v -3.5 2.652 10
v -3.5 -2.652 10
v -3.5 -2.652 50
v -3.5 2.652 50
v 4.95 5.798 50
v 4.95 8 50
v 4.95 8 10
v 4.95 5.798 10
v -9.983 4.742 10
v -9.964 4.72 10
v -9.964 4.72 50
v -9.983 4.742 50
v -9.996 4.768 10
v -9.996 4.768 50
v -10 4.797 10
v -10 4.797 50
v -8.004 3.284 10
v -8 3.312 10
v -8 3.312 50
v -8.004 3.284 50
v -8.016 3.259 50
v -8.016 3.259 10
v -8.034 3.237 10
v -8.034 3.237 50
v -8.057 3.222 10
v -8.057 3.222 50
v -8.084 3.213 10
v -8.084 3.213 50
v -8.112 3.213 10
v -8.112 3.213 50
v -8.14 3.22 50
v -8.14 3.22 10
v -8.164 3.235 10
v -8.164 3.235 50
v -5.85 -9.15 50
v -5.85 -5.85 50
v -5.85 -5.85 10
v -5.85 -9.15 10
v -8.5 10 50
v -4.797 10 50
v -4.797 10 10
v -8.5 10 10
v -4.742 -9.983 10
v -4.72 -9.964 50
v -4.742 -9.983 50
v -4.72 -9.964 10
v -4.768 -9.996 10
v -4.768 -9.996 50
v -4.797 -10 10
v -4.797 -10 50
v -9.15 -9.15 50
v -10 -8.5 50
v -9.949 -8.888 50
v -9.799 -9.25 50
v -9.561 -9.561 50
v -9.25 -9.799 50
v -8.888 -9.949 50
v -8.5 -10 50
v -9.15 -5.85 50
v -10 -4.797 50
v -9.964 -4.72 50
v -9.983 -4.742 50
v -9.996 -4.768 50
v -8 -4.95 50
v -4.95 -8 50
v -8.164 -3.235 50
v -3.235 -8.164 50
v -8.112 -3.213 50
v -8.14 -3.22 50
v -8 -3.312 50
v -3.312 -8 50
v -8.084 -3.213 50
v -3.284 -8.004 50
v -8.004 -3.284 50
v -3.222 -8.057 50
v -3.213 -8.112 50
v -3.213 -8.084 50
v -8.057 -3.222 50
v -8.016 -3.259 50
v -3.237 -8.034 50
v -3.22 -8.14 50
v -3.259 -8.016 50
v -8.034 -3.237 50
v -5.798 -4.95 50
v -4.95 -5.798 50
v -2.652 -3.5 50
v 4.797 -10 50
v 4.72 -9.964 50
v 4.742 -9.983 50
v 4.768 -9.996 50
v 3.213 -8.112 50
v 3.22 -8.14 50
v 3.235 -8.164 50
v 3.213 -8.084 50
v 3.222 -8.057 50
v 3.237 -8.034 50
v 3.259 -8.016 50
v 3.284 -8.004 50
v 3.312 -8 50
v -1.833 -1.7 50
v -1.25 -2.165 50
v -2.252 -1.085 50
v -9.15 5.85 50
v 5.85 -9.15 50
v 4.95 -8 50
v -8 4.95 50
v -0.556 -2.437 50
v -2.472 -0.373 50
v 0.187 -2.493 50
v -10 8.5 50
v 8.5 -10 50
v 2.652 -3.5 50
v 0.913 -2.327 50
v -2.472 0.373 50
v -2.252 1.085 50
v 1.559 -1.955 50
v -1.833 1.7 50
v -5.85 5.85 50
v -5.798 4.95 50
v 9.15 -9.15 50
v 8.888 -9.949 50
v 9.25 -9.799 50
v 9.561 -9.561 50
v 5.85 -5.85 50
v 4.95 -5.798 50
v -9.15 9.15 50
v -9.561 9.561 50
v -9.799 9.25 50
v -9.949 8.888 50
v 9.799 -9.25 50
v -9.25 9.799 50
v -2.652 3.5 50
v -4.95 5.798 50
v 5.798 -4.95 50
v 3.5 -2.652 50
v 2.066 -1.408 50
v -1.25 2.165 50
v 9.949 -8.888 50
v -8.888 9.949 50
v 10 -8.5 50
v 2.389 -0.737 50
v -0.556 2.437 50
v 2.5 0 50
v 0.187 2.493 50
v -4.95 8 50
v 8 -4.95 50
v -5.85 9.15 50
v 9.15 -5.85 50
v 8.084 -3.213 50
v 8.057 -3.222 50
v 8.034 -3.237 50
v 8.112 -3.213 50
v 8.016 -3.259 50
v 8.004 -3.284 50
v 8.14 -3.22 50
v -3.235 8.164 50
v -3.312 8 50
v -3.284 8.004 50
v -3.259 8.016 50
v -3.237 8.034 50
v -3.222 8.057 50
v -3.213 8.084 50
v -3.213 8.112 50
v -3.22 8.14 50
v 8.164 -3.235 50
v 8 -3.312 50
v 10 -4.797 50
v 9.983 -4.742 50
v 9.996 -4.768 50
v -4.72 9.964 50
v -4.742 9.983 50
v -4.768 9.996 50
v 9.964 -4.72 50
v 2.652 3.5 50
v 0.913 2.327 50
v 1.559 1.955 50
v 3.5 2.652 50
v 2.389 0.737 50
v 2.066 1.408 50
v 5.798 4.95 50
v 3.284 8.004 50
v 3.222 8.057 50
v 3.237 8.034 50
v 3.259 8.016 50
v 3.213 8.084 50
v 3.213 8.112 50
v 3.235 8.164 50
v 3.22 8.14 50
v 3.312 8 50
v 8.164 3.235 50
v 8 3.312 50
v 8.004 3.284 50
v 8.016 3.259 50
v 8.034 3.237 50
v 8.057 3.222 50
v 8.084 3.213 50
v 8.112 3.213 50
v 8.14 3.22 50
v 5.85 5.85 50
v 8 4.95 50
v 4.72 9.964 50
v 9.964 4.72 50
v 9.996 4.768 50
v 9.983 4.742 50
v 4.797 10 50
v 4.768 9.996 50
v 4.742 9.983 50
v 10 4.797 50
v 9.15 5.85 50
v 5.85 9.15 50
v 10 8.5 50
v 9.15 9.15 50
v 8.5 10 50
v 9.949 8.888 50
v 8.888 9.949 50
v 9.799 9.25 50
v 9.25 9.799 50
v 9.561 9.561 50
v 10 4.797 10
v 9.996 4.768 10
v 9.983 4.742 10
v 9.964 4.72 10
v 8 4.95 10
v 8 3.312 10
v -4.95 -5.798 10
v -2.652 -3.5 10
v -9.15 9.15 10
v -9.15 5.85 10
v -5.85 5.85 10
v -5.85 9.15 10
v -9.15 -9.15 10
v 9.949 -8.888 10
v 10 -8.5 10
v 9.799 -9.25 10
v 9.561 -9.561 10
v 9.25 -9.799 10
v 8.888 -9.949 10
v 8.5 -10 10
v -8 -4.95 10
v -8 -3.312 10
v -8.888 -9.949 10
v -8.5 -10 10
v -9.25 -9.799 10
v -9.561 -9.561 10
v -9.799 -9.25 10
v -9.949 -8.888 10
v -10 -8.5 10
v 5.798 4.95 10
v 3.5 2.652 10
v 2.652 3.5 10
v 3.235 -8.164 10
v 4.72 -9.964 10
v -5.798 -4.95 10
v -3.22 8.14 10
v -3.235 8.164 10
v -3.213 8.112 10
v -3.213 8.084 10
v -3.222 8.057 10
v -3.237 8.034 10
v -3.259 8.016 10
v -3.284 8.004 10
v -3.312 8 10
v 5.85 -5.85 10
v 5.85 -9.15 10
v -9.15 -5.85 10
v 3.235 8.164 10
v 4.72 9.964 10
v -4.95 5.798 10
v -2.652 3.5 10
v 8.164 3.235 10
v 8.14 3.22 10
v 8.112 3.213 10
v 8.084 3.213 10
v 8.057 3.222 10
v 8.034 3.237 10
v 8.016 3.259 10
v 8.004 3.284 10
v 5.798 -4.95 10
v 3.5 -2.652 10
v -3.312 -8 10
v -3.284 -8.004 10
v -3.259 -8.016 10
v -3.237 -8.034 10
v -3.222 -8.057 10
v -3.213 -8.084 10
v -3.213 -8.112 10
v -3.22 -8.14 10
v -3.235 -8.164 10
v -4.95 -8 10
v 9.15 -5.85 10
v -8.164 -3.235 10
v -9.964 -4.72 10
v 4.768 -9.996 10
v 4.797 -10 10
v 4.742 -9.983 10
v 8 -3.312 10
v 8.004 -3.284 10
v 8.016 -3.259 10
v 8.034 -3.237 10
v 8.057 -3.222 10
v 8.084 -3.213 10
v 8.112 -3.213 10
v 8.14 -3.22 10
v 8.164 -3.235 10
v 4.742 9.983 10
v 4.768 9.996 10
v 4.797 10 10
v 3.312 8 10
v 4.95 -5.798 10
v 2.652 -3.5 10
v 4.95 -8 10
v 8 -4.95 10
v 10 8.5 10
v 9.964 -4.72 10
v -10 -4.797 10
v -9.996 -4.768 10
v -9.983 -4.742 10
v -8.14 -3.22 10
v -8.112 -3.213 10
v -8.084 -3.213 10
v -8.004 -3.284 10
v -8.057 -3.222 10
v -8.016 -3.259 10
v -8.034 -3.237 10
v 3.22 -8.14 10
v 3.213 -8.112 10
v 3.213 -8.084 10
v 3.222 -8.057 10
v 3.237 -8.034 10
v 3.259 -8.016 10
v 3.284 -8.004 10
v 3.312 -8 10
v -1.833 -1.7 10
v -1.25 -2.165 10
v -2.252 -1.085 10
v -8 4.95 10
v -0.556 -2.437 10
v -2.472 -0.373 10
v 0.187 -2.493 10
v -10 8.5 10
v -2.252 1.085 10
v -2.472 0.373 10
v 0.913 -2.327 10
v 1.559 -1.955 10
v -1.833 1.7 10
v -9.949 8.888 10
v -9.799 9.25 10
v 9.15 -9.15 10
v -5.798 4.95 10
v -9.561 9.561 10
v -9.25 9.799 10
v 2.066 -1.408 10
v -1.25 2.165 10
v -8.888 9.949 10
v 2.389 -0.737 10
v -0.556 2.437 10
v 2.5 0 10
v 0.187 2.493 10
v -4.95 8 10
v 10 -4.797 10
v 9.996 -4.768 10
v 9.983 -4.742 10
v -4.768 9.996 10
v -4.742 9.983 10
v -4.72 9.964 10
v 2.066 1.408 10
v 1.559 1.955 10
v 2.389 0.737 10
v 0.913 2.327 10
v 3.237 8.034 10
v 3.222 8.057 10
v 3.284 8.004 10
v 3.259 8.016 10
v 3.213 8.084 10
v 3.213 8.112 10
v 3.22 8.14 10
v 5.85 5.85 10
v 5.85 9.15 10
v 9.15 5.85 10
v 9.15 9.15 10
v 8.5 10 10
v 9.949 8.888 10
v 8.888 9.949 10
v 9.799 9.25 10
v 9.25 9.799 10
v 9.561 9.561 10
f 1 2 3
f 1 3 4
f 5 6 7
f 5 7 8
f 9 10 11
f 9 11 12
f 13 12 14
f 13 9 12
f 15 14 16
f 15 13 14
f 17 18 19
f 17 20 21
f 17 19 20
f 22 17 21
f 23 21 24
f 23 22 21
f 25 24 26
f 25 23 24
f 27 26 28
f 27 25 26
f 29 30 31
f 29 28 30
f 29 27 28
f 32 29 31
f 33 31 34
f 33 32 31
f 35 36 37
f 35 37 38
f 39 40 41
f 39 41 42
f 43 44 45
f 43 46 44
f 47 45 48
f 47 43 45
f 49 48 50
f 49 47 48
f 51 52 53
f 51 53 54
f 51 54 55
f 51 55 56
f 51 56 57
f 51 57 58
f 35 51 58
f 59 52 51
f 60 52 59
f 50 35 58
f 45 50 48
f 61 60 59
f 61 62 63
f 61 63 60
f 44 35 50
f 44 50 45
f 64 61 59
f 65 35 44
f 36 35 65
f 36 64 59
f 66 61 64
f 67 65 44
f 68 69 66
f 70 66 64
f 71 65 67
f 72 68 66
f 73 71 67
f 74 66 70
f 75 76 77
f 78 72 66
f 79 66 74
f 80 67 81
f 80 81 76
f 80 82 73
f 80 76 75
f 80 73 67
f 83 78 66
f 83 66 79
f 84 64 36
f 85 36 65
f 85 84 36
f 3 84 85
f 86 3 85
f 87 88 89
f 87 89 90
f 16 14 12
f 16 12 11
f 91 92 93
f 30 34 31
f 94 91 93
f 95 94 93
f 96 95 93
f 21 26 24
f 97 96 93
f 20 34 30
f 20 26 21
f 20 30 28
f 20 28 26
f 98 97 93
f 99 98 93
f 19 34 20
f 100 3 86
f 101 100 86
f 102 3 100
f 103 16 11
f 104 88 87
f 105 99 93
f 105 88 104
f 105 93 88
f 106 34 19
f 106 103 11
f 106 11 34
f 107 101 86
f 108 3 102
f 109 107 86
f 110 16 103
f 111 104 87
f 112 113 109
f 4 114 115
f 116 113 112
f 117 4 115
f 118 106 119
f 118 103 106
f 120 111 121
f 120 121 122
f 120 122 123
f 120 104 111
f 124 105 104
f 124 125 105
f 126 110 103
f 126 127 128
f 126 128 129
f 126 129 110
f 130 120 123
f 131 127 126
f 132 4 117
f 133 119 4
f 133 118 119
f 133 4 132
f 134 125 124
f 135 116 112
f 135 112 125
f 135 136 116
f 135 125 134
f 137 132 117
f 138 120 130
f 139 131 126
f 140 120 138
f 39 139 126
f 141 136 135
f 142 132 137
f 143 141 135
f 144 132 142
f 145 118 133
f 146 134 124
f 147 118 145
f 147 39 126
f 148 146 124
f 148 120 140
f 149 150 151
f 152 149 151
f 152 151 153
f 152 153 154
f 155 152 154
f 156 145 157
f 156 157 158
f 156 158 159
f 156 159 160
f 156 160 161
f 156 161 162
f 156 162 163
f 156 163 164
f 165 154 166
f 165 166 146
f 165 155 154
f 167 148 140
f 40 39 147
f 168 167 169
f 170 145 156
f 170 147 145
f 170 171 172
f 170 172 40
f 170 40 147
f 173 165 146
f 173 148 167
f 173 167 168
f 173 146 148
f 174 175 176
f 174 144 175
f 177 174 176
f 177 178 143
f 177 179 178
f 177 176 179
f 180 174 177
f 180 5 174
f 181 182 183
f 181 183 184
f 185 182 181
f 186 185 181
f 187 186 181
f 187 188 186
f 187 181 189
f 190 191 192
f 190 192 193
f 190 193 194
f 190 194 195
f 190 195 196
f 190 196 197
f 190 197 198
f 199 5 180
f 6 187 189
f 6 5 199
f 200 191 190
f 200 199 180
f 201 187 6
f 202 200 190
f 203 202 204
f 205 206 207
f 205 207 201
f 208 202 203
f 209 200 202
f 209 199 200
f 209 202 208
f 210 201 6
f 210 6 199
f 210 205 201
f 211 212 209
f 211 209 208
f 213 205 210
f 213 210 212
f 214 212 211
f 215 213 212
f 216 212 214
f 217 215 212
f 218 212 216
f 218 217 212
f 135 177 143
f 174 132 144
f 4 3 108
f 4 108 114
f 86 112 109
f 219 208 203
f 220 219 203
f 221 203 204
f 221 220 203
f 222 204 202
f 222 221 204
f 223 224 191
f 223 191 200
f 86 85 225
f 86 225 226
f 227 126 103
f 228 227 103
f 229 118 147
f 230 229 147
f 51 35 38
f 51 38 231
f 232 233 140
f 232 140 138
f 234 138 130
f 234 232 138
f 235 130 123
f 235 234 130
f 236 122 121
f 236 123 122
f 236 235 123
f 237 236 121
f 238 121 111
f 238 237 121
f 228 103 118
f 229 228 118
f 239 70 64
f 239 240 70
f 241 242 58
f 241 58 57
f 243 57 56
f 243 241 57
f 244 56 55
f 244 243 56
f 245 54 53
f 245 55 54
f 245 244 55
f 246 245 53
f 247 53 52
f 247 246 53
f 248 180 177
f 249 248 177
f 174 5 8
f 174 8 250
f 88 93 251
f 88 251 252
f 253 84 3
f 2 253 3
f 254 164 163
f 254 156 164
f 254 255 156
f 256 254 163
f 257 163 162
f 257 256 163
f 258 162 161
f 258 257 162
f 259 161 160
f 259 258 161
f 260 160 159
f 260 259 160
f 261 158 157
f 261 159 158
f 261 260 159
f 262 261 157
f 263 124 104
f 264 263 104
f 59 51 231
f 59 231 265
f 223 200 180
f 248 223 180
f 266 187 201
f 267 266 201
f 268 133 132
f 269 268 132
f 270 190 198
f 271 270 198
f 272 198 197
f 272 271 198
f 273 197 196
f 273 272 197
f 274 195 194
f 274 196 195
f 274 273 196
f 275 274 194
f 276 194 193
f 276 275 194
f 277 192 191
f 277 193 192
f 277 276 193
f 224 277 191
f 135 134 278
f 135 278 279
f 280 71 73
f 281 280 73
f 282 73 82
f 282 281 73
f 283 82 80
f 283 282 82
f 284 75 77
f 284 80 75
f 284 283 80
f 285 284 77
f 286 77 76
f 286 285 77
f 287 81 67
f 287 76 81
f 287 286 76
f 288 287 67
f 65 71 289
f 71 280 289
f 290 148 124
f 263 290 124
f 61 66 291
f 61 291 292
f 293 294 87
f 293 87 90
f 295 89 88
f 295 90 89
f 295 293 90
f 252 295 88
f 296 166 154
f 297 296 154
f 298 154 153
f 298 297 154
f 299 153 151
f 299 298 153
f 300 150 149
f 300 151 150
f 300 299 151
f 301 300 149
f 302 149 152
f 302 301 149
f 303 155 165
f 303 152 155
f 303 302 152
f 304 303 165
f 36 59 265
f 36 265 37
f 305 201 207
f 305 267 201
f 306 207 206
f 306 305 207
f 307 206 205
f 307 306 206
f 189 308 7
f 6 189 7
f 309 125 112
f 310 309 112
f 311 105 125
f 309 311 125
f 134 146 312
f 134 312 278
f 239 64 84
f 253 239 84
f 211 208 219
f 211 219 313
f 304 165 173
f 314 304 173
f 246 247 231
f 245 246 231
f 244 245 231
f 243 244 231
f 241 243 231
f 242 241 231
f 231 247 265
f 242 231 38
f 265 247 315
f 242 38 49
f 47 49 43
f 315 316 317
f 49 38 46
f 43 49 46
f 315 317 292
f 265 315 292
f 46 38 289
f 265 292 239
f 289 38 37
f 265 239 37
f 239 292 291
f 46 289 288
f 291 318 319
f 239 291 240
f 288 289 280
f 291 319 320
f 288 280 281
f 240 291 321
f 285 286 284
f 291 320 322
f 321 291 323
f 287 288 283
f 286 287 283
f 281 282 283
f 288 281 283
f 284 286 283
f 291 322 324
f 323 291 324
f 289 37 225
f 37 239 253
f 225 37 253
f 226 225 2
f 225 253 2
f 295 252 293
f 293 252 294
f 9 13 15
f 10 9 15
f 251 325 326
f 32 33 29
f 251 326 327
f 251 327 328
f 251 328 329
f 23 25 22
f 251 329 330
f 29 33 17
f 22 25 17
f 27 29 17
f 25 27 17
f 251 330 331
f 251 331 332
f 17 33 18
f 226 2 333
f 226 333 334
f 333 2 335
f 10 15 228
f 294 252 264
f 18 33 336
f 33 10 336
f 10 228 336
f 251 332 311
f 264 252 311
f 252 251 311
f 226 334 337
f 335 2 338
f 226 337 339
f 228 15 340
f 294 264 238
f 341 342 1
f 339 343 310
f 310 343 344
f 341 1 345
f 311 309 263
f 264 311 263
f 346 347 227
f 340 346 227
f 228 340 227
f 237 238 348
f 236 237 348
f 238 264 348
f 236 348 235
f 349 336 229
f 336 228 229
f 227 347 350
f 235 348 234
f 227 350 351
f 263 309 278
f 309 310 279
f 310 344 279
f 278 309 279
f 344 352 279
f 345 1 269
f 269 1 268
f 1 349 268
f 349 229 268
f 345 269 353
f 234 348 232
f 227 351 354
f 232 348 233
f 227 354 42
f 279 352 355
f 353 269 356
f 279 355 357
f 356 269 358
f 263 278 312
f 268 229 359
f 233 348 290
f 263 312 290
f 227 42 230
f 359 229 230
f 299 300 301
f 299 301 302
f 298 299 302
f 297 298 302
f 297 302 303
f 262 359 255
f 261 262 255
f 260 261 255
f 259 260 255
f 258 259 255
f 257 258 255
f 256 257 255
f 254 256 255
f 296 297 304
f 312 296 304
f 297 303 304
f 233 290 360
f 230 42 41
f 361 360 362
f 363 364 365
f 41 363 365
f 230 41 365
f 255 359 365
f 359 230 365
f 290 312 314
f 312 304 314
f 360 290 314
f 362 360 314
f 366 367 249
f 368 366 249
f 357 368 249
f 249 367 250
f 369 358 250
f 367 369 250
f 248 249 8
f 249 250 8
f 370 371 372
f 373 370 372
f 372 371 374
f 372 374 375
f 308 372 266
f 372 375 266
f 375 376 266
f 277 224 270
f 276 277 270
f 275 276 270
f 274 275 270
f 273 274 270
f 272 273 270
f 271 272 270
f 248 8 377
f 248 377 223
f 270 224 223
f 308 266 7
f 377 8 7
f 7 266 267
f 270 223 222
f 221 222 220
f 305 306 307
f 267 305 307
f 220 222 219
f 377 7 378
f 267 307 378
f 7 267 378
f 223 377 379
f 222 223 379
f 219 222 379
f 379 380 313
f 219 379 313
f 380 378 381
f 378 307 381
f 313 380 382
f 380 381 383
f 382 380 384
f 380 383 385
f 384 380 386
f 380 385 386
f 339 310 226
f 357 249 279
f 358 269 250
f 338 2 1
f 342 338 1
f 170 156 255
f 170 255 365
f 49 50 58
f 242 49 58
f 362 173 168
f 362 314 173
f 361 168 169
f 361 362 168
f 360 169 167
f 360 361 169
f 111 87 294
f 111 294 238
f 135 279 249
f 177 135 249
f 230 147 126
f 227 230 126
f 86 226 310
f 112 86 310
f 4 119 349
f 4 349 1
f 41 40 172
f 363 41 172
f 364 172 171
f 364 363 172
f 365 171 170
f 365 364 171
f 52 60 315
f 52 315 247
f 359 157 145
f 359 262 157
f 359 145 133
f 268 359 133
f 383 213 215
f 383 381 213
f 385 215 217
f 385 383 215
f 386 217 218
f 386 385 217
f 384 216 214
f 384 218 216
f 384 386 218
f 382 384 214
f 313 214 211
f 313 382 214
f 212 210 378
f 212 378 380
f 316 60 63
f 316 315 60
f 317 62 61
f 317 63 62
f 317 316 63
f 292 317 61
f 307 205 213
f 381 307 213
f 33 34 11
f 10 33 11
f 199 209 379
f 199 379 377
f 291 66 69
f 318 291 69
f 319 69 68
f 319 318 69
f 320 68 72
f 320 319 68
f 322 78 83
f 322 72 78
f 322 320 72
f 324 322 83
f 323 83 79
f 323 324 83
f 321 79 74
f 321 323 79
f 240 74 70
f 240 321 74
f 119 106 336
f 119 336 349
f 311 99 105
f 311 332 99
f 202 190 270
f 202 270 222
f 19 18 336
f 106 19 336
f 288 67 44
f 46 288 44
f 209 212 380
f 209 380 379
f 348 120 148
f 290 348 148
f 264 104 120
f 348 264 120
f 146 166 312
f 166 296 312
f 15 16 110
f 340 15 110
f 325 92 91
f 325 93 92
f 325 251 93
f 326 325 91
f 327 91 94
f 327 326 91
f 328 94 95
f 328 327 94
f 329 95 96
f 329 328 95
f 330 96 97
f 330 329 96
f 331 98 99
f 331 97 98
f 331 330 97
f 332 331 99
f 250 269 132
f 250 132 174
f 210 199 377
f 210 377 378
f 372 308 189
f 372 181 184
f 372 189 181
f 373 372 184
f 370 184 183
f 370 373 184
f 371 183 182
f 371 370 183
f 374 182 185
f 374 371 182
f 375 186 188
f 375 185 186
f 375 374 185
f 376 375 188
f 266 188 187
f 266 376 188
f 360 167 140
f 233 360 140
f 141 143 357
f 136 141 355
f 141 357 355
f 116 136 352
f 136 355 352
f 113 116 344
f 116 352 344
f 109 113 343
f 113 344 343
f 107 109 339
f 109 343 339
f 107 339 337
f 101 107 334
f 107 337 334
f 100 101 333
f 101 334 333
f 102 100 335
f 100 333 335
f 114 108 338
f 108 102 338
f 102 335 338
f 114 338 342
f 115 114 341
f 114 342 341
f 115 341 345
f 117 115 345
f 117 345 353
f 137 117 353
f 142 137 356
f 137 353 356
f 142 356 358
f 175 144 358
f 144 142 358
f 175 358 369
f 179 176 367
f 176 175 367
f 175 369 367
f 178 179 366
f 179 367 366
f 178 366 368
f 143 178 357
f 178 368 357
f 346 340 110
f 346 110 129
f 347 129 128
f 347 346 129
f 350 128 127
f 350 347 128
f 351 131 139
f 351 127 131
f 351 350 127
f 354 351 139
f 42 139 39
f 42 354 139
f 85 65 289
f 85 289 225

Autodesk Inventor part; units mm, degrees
ref_plane "Начальная плоскость" through (0, 0, 10) normal (0, 0, 1) x (1, 0, 0)
ref_plane "Конечная плоскость" through (0, 0, 50) normal (0, 0, 1) x (1, 0, 0)
sketch "Эскиз" plane through (0, 0, 0) normal (0, 0, 1) x (1, 0, 0)
  line L0 (-14.4349, 0) -> (14.4349, 0) projected
  line L1 (0, -14) -> (0, 14) projected
  line L2 (0, 0) -> (7.5, 7.5) construction
  circle A0 centre (7.5, 7.5) radius 1.65 construction
  line L3 (5.85, 9.15) -> (9.15, 9.15)
  line L4 (9.15, 9.15) -> (9.15, 5.85)
  line L5 (9.15, 5.85) -> (5.85, 5.85)
  line L6 (5.85, 5.85) -> (5.85, 9.15)
  line L7 (3.235, 8.1636) -> (4.72, 9.9636)
  line L8 (4.7971, 10) -> (8.5, 10)
  line L9 (3.3121, 8) -> (4.95, 8)
  line L10 (4.95, 8) -> (4.95, 5.7985)
  line L11 (4.95, 5.7985) -> (2.6515, 3.5)
  line L12 (0, 3.5) -> (2.6515, 3.5)
  circle A1 centre (0, 0) radius 2.5
  line L13 (8.1636, 3.235) -> (9.9636, 4.72)
  line L14 (10, 4.7971) -> (10, 8.5)
  line L15 (8, 3.3121) -> (8, 4.95)
  line L16 (8, 4.95) -> (5.7985, 4.95)
  line L17 (5.7985, 4.95) -> (3.5, 2.6515)
  line L18 (3.5, 0) -> (3.5, 2.6515)
  arc A2 (10, 8.5) -> (8.5, 10) centre (8.5, 8.5) ccw
  line L19 (0, 0) -> (-7.5, 7.5) construction
  circle A3 centre (-7.5, 7.5) radius 1.65 construction
  line L20 (-5.85, 9.15) -> (-9.15, 9.15)
  line L21 (-9.15, 9.15) -> (-9.15, 5.85)
  line L22 (-9.15, 5.85) -> (-5.85, 5.85)
  line L23 (-5.85, 5.85) -> (-5.85, 9.15)
  line L24 (-3.235, 8.1636) -> (-4.72, 9.9636)
  line L25 (-4.7971, 10) -> (-8.5, 10)
  line L26 (-3.3121, 8) -> (-4.95, 8)
  line L27 (-4.95, 8) -> (-4.95, 5.7985)
  line L28 (-4.95, 5.7985) -> (-2.6515, 3.5)
  line L29 (0, 3.5) -> (-2.6515, 3.5)
  line L30 (-3.5, 0) -> (-3.5, 2.6515)
  line L31 (-5.7985, 4.95) -> (-3.5, 2.6515)
  line L32 (-8, 4.95) -> (-5.7985, 4.95)
  line L33 (-8, 3.3121) -> (-8, 4.95)
  line L34 (-8.1636, 3.235) -> (-9.9636, 4.72)
  line L35 (-10, 4.7971) -> (-10, 8.5)
  arc A4 (-8.5, 10) -> (-10, 8.5) centre (-8.5, 8.5) ccw
  line L36 (0, 14) -> (0, -14)
  line L37 (0, 0) -> (7.5, -7.5) construction
  circle A5 centre (7.5, -7.5) radius 1.65 construction
  line L38 (5.85, -9.15) -> (9.15, -9.15)
  line L39 (9.15, -9.15) -> (9.15, -5.85)
  line L40 (9.15, -5.85) -> (5.85, -5.85)
  line L41 (5.85, -5.85) -> (5.85, -9.15)
  line L42 (3.235, -8.1636) -> (4.72, -9.9636)
  line L43 (4.7971, -10) -> (8.5, -10)
  line L44 (3.3121, -8) -> (4.95, -8)
  line L45 (4.95, -8) -> (4.95, -5.7985)
  line L46 (4.95, -5.7985) -> (2.6515, -3.5)
  line L47 (0, -3.5) -> (2.6515, -3.5)
  line L48 (3.5, 0) -> (3.5, -2.6515)
  line L49 (5.7985, -4.95) -> (3.5, -2.6515)
  line L50 (8, -4.95) -> (5.7985, -4.95)
  line L51 (8, -3.3121) -> (8, -4.95)
  line L52 (8.1636, -3.235) -> (9.9636, -4.72)
  line L53 (10, -4.7971) -> (10, -8.5)
  arc A6 (8.5, -10) -> (10, -8.5) centre (8.5, -8.5) ccw
  line L54 (0, 0) -> (-7.5, -7.5) construction
  line L55 (-4.95, -8) -> (-4.95, -5.7985)
  line L56 (-3.3121, -8) -> (-4.95, -8)
  line L57 (-5.7985, -4.95) -> (-3.5, -2.6515)
  line L58 (-4.95, -5.7985) -> (-2.6515, -3.5)
  line L59 (-3.5, 0) -> (-3.5, -2.6515)
  line L60 (0, -3.5) -> (-2.6515, -3.5)
  circle A7 centre (-7.5, -7.5) radius 1.65 construction
  line L61 (-5.85, -5.85) -> (-5.85, -9.15)
  line L62 (-5.85, -9.15) -> (-9.15, -9.15)
  line L63 (-9.15, -9.15) -> (-9.15, -5.85)
  line L64 (-9.15, -5.85) -> (-5.85, -5.85)
  line L65 (-3.235, -8.1636) -> (-4.72, -9.9636)
  line L66 (-8, -4.95) -> (-5.7985, -4.95)
  line L67 (-8, -3.3121) -> (-8, -4.95)
  line L68 (-8.1636, -3.235) -> (-9.9636, -4.72)
  line L69 (-4.7971, -10) -> (-8.5, -10)
  line L70 (-10, -4.7971) -> (-10, -8.5)
  arc A8 (-10, -8.5) -> (-8.5, -10) centre (-8.5, -8.5) ccw
  arc A9 (3.235, 8.1636) -> (3.3121, 8) centre (3.3121, 8.1) ccw
  arc A10 (4.7971, 10) -> (4.72, 9.9636) centre (4.7971, 9.9) ccw
  arc A11 (8, 3.3121) -> (8.1636, 3.235) centre (8.1, 3.3121) ccw
  arc A12 (9.9636, 4.72) -> (10, 4.7971) centre (9.9, 4.7971) ccw
  arc A13 (-3.3121, 8) -> (-3.235, 8.1636) centre (-3.3121, 8.1) ccw
  arc A14 (-4.72, 9.9636) -> (-4.7971, 10) centre (-4.7971, 9.9) ccw
  arc A15 (-8.1636, 3.235) -> (-8, 3.3121) centre (-8.1, 3.3121) ccw
  arc A16 (-10, 4.7971) -> (-9.9636, 4.72) centre (-9.9, 4.7971) ccw
  arc A17 (-8, -3.3121) -> (-8.1636, -3.235) centre (-8.1, -3.3121) ccw
  arc A18 (-9.9636, -4.72) -> (-10, -4.7971) centre (-9.9, -4.7971) ccw
  arc A19 (-3.235, -8.1636) -> (-3.3121, -8) centre (-3.3121, -8.1) ccw
  arc A20 (-4.7971, -10) -> (-4.72, -9.9636) centre (-4.7971, -9.9) ccw
  arc A21 (4.72, -9.9636) -> (4.7971, -10) centre (4.7971, -9.9) ccw
  arc A22 (3.3121, -8) -> (3.235, -8.1636) centre (3.3121, -8.1) ccw
  arc A23 (8.1636, -3.235) -> (8, -3.3121) centre (8.1, -3.3121) ccw
  arc A24 (10, -4.7971) -> (9.9636, -4.72) centre (9.9, -4.7971) ccw
  point P0 (3.1, 8)
  point P1 (4.75, 10)
  point P2 (7.5, 9.15)
  point P3 (8, 3.1)
  point P4 (10, 4.75)
  point P5 (7.5, 5.85)
  point P6 (9.15, 7.5)
  point P7 (-3.1, 8)
  point P8 (-4.75, 10)
  point P9 (-7.5, 9.15)
  point P10 (-8, 3.1)
  point P11 (-10, 4.75)
  point P12 (-7.5, 5.85)
  point P13 (-9.15, 7.5)
  point P14 (3.1, -8)
  point P15 (4.75, -10)
  point P16 (7.5, -9.15)
  point P17 (8, -3.1)
  point P18 (10, -4.75)
  point P19 (7.5, -5.85)
  point P20 (9.15, -7.5)
  point P21 (-3.1, -8)
  point P22 (-7.5, -5.85)
  point P23 (-7.5, -9.15)
  point P24 (-9.15, -7.5)
  point P25 (-4.75, -10)
  point P26 (-8, -3.1)
  point P27 (-10, -4.75)
  dimension "d0" = 45
  dimension "d1" = 3.3
  dimension "d2" = 1.5
  dimension "d3" = 1.2
  dimension "d4" = 5
  dimension "d5" = 6.5
  dimension "d6" = 15
  dimension "d7" = 20
  dimension "d8" = 9.9
  dimension "d9" = 9.5
  dimension "d10" = 6.2
  dimension "d11" = 2
  dimension "d18" = 0.1
  dimension "d19" = 0.1
extrude "Тело" add sketch "Эскиз" along normal up to surface (40 mm away) from surface at 10 contours A1 L1 L12 L11 L10 L9 A9 L7 A10 L8 A2 L14 A12 L13 A11 L15 L16 L17 L18 L0 | L0 L48 L49 L50 L51 A23 L52 A24 L53 A6 L43 A21 L42 A22 L44 L45 L46 L47 L1 A1 | A1 L0 L30 L31 L32 L33 A15 L34 A16 L35 A4 L25 A14 L24 A13 L26 L27 L28 L29 L1 | L1 L60 L58 L55 L56 A19 L65 A20 L69 A8 L70 A18 L68 A17 L67 L66 L57 L59 L0 A1
sketch "Эскиз2" plane through (0, 0, 0) normal (0, 0, 1) x (1, 0, 0)
  line L0 (0, 0) -> (10, 0)
ref_plane "РабПлоскость3" through (0, 0, 0) normal (0, -1, 0) x (1, 0, 0)
sketch "Эскиз3" plane through (0, 0, 0) normal (0, -1, 0) x (1, 0, 0)
  line L0 (-2, 10) -> (12, 10)
  line L1 (-2, 50) -> (12, 50)
  dimension "d25" = 40
ref_plane "РабПлоскость4" through (-8.5, 255, 50) normal (0, 0, 1) x (1, 0, 0)
split "Разделение1" plane through (-8.5, 255, 50) removes the side toward (0, 0, 1)
ref_plane "РабПлоскость5" through (4.7971, -255, 10) normal (0, 0, -1) x (-1, 0, 0)
split "Разделение2" plane through (4.7971, -255, 10) removes the side toward (0, 0, -1)
properties part number "короткая палка"
